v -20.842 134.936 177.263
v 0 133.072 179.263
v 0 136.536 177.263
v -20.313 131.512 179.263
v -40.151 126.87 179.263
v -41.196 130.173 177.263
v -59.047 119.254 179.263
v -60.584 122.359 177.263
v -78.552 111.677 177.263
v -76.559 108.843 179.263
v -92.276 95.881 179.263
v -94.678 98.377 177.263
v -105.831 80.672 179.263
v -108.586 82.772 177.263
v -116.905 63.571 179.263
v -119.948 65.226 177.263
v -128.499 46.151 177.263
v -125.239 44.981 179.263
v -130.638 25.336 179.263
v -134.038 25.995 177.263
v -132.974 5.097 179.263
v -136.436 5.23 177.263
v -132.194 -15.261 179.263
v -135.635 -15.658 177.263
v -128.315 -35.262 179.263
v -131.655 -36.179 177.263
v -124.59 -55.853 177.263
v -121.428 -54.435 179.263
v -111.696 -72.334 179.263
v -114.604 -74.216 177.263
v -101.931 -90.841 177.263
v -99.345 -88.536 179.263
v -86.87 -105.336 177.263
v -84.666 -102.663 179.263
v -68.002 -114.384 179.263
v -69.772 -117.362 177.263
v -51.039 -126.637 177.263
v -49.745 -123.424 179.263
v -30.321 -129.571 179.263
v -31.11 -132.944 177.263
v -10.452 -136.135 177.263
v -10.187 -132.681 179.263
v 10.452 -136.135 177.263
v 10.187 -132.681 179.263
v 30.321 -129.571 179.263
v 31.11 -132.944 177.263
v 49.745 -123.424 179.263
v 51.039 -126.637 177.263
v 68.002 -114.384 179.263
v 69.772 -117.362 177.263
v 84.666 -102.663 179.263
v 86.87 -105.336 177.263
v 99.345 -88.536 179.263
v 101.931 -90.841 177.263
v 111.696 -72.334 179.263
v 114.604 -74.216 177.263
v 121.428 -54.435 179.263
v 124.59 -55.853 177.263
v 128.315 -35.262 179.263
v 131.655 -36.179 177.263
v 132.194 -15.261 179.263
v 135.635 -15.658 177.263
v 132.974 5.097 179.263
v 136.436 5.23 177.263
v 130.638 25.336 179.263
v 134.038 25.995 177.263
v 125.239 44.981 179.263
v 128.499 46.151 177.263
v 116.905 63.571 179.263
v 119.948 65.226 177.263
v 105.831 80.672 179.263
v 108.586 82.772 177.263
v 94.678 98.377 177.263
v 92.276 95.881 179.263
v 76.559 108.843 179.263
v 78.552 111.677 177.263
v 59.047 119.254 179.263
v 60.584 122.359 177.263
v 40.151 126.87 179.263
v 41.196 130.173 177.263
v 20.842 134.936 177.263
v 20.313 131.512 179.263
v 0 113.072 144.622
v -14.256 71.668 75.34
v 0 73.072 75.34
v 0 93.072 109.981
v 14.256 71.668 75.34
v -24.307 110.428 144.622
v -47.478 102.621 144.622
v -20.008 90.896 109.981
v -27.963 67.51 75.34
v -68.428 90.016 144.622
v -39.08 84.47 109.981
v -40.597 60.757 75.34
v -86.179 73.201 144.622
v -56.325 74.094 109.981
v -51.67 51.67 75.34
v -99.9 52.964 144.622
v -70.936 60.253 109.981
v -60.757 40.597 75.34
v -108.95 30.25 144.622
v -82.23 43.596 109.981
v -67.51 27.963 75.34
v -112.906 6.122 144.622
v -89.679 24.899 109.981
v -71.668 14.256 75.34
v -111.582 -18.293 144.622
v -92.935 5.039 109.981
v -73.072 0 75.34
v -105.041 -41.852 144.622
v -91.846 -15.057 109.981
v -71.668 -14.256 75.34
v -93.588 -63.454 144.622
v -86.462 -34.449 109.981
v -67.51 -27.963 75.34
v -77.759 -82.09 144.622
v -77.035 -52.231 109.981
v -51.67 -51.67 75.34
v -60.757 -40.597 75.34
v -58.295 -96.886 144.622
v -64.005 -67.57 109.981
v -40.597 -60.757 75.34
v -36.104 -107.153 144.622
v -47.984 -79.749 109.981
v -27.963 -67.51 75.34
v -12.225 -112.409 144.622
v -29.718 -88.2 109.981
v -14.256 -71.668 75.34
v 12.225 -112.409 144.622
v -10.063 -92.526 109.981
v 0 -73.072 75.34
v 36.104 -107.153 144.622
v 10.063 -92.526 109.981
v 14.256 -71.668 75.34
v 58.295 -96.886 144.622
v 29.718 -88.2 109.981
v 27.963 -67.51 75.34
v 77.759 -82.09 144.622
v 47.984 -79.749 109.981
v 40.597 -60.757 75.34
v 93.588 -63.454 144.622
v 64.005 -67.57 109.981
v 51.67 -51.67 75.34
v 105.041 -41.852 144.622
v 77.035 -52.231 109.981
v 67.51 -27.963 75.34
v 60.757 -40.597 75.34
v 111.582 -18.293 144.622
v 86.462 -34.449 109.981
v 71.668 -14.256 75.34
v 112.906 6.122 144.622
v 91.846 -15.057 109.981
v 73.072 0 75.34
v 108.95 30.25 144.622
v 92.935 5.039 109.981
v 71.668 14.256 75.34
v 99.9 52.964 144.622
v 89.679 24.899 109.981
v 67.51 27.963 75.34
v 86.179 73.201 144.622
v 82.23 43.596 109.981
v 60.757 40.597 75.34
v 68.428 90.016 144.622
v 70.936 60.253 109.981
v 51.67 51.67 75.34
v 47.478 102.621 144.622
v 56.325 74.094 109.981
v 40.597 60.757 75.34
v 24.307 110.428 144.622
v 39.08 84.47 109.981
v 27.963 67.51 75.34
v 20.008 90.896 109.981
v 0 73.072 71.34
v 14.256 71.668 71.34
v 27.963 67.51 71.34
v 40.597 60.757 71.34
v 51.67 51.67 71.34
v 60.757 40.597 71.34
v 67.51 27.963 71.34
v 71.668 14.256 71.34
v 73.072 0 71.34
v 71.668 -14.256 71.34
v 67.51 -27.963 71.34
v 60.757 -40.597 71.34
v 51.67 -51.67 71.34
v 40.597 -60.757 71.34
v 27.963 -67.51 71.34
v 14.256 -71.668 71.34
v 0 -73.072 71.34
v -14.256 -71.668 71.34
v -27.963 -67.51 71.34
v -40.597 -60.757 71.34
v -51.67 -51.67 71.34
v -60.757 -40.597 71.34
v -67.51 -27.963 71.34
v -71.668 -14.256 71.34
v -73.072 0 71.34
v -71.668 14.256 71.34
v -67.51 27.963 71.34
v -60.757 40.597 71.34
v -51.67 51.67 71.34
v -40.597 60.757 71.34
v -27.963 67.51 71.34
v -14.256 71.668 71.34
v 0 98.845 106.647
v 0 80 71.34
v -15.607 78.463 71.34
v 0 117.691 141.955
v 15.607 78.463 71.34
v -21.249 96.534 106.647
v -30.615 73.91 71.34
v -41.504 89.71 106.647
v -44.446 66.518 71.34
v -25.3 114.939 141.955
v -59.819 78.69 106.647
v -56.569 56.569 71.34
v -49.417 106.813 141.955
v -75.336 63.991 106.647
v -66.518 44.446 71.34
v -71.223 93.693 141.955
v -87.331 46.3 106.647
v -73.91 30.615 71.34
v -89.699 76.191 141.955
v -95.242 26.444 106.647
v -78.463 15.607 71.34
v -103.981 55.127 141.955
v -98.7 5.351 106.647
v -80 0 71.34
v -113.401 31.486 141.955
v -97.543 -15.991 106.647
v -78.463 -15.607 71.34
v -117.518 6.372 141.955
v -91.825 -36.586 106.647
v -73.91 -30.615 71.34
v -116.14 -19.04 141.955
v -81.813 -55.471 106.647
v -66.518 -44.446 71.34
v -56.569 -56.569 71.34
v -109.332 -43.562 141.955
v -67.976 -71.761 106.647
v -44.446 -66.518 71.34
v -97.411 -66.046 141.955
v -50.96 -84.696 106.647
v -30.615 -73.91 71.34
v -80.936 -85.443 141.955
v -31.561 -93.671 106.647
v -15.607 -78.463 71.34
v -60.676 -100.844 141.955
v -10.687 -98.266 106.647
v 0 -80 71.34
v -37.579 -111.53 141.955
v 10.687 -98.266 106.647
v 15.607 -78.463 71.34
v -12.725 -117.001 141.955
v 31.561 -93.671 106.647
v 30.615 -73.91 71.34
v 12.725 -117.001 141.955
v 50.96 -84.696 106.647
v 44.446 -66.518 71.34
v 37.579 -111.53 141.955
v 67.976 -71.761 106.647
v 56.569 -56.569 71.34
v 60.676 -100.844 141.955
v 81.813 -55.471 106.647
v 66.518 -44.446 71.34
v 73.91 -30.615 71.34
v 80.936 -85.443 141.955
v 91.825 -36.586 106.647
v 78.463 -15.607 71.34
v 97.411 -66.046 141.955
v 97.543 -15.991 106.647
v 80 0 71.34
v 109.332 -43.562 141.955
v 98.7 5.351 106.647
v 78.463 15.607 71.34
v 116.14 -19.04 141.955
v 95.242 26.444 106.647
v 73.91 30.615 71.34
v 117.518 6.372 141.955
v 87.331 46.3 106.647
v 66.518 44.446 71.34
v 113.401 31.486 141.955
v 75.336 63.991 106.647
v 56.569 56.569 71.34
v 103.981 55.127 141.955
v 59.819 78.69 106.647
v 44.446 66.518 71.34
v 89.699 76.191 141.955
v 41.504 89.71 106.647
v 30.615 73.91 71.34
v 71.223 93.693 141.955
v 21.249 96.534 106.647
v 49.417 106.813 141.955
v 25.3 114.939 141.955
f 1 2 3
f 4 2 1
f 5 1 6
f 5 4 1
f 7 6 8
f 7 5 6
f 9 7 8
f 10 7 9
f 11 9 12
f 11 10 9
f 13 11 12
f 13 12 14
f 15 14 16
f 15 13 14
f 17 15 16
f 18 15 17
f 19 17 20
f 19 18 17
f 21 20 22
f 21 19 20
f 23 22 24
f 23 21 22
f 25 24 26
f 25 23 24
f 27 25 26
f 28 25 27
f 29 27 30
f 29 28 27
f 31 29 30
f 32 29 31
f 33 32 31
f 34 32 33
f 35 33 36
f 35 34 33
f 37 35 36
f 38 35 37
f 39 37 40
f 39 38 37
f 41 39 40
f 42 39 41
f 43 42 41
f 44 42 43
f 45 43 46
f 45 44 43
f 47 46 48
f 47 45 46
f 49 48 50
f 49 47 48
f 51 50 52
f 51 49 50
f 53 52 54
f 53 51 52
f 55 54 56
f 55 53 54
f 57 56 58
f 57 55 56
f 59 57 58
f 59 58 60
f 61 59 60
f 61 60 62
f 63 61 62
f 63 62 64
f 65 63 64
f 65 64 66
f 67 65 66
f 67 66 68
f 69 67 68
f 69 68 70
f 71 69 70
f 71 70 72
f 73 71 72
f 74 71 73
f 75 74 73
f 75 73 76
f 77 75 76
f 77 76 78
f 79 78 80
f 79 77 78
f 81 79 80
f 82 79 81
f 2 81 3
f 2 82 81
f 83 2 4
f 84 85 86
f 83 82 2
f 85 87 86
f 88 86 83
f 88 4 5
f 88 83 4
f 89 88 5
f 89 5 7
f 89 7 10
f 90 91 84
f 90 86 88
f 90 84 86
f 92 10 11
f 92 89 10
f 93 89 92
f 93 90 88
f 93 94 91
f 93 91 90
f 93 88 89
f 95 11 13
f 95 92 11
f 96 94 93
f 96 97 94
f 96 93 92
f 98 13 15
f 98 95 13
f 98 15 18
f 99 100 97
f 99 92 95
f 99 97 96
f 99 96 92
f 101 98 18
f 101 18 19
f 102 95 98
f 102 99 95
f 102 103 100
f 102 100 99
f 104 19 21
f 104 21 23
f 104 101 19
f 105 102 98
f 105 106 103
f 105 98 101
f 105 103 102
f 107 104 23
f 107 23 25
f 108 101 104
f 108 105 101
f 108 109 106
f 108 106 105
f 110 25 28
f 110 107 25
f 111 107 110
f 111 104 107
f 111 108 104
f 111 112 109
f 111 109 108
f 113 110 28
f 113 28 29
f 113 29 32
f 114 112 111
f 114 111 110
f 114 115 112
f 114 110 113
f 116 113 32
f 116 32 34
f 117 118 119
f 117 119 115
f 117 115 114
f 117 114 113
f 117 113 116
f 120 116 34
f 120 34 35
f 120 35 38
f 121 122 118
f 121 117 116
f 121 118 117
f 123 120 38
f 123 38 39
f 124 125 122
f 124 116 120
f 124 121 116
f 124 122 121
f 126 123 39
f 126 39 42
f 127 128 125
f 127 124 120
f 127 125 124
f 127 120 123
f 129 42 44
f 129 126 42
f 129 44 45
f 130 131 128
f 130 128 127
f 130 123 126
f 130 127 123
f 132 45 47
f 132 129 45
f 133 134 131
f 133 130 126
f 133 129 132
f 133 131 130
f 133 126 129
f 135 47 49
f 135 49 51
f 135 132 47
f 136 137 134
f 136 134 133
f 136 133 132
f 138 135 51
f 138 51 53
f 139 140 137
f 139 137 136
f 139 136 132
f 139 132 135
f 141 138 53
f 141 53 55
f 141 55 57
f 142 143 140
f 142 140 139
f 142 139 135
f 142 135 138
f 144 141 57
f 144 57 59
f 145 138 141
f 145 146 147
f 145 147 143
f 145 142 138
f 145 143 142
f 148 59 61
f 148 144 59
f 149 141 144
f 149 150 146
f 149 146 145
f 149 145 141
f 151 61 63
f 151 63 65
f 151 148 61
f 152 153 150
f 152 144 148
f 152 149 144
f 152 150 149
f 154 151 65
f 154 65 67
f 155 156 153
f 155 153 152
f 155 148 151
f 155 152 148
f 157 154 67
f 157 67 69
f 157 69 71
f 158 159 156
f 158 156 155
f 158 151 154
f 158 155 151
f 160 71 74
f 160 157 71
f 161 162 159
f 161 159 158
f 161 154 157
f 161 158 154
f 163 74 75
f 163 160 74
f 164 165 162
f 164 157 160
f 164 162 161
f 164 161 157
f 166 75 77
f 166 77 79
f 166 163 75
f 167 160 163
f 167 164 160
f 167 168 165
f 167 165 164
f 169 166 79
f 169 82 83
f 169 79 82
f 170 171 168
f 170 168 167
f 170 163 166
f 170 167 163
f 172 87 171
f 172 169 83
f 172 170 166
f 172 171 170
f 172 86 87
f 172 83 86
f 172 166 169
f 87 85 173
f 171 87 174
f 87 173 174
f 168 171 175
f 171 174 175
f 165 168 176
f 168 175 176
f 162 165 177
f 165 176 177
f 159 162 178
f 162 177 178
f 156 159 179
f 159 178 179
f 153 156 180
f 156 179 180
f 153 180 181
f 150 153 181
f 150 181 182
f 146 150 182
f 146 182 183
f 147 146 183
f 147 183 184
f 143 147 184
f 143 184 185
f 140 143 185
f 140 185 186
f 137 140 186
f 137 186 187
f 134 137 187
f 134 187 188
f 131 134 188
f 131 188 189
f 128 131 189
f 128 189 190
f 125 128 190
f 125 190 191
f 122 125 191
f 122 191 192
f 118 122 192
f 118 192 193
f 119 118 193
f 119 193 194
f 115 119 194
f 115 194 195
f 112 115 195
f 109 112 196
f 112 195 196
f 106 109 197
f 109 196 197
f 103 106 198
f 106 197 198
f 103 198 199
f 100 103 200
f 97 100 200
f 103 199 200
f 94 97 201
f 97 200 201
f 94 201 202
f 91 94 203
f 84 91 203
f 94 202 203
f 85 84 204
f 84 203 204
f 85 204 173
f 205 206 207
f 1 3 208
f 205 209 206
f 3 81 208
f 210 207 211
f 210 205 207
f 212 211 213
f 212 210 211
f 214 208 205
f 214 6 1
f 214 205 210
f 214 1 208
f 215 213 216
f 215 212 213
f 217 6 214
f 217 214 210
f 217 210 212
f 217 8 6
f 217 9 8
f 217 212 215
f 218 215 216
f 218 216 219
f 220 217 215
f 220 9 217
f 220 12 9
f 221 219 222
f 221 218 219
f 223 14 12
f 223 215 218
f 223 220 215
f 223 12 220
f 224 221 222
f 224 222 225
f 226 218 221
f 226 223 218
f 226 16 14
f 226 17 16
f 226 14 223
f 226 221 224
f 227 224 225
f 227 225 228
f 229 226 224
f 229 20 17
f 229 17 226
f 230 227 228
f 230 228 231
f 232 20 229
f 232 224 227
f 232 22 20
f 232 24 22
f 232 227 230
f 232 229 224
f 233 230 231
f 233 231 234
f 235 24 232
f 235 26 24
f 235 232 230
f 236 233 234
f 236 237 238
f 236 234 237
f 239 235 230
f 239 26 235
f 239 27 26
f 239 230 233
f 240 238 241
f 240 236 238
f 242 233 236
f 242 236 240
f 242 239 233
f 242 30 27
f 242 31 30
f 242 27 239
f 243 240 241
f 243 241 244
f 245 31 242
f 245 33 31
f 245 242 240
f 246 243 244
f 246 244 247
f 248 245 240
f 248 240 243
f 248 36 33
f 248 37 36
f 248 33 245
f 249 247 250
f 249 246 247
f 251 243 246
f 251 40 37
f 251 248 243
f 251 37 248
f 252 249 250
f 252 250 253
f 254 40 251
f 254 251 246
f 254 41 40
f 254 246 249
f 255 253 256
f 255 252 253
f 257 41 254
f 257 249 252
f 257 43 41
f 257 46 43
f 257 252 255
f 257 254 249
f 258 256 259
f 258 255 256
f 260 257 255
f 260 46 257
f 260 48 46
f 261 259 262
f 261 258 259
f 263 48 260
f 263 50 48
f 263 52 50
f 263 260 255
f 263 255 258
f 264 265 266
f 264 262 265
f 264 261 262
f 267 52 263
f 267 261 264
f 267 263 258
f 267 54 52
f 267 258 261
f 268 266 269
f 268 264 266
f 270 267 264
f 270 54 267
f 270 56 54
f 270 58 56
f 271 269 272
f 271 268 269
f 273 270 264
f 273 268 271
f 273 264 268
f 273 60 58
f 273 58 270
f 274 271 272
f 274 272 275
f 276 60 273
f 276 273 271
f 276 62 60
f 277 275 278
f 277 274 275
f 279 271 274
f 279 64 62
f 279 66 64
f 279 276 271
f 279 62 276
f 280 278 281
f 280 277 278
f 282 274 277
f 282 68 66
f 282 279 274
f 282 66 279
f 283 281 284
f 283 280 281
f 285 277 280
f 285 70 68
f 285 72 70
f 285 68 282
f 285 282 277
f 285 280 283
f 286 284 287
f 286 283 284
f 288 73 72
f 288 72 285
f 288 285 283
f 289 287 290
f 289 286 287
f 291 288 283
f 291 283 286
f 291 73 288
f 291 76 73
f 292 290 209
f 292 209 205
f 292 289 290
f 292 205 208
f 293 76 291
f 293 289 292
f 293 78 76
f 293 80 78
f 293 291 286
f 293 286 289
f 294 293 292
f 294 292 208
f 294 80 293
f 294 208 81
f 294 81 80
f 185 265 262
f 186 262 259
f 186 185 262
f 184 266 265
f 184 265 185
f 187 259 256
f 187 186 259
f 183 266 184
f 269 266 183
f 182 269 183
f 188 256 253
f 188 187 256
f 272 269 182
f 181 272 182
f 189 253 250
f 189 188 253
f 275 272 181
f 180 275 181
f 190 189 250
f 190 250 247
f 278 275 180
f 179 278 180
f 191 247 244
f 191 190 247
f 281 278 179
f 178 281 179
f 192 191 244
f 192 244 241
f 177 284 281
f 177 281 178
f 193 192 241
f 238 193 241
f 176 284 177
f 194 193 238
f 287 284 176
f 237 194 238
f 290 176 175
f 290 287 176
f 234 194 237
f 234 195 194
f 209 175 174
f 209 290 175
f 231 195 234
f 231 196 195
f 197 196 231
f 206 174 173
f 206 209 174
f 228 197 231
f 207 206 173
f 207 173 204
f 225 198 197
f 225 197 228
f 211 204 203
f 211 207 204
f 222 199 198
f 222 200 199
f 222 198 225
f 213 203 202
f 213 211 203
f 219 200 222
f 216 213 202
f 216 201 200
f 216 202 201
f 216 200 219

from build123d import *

# Parameters (mm, degrees)
SKETCH_1_R          = 100
SKETCH_1_R_2        = 95
EXTRUDE_1_DEPTH     = 70
EXTRUDE_START       = 5
SKETCH_2_R          = 100
EXTRUDE_2_DEPTH     = 5
SKETCH_6_R          = 100
CUT_EXTRUDE_1_DEPTH = 75
EXTRUDE_3_REACH     = 223.205
SKETCH_8_R          = 80
SKETCH_8_R_2        = 73.07179677


with BuildPart() as part:
    # 草图1 → 凸台-拉伸1 (new body)
    with BuildSketch(Plane.XY):
        Circle(SKETCH_1_R)
        Circle(SKETCH_1_R_2, mode=Mode.SUBTRACT)
    extrude(amount=EXTRUDE_1_DEPTH)

    # 草图2 → 凸台-拉伸2 (add)
    with BuildSketch(Plane(origin=(0, 0, 0), x_dir=(-1, 0, 0), z_dir=(0, 0, -1)).offset(EXTRUDE_START)):
        Circle(SKETCH_2_R)
    extrude(amount=-EXTRUDE_2_DEPTH)

    # 草图6 → 切除-拉伸1 (cut)
    with BuildSketch(Plane(origin=(0, 0, -5), x_dir=(-1, 0, 0), z_dir=(0, 0, -1))):
        Circle(SKETCH_6_R)
    extrude(amount=-CUT_EXTRUDE_1_DEPTH, mode=Mode.SUBTRACT)


with BuildPart() as body_2:
    # 草图5 → 旋转1 (revolve)
    with BuildSketch(Plane(origin=(0, 0, 0), x_dir=(0, 0, -1), z_dir=(1, 0, 0))):
        Polygon((-75.339745962, 73.07179677), (-71.339745962, 80), (-177.262794416, 136.535898385), (-179.262794416, 133.07179677), align=None)
    revolve(axis=Axis((0, 0, 0), (0, 0, 1)))

    # 凸台-拉伸3: up to this cone (the profile starts outside it)
    extrude_3_end = Plane(origin=(0, 0, 71.339746), z_dir=(0, 0, 1)).offset(-122.564063643) * Cone(1e-06, 240.773225898, 417.031459358, align=(Align.CENTER, Align.CENTER, Align.MIN), mode=Mode.PRIVATE)
    # 草图8 → 凸台-拉伸3 (add, up to the surface)
    with BuildSketch(Plane(origin=(0, 0, 71.339745962), x_dir=(-1, 0, 0), z_dir=(0, 0, -1)), mode=Mode.PRIVATE) as extrude_3_sk1:
        Circle(SKETCH_8_R)
        with Locations(Location((0, 0, 0), (0, 0, 90))):
            Circle(SKETCH_8_R_2, mode=Mode.SUBTRACT)
    extrude_3_tool1 = extrude(extrude_3_sk1.sketch, amount=-EXTRUDE_3_REACH, mode=Mode.PRIVATE) - extrude_3_end
    add(extrude_3_tool1.solids().sort_by_distance((77.737258, 0, 71.339746))[0])


solid = body_2.part
